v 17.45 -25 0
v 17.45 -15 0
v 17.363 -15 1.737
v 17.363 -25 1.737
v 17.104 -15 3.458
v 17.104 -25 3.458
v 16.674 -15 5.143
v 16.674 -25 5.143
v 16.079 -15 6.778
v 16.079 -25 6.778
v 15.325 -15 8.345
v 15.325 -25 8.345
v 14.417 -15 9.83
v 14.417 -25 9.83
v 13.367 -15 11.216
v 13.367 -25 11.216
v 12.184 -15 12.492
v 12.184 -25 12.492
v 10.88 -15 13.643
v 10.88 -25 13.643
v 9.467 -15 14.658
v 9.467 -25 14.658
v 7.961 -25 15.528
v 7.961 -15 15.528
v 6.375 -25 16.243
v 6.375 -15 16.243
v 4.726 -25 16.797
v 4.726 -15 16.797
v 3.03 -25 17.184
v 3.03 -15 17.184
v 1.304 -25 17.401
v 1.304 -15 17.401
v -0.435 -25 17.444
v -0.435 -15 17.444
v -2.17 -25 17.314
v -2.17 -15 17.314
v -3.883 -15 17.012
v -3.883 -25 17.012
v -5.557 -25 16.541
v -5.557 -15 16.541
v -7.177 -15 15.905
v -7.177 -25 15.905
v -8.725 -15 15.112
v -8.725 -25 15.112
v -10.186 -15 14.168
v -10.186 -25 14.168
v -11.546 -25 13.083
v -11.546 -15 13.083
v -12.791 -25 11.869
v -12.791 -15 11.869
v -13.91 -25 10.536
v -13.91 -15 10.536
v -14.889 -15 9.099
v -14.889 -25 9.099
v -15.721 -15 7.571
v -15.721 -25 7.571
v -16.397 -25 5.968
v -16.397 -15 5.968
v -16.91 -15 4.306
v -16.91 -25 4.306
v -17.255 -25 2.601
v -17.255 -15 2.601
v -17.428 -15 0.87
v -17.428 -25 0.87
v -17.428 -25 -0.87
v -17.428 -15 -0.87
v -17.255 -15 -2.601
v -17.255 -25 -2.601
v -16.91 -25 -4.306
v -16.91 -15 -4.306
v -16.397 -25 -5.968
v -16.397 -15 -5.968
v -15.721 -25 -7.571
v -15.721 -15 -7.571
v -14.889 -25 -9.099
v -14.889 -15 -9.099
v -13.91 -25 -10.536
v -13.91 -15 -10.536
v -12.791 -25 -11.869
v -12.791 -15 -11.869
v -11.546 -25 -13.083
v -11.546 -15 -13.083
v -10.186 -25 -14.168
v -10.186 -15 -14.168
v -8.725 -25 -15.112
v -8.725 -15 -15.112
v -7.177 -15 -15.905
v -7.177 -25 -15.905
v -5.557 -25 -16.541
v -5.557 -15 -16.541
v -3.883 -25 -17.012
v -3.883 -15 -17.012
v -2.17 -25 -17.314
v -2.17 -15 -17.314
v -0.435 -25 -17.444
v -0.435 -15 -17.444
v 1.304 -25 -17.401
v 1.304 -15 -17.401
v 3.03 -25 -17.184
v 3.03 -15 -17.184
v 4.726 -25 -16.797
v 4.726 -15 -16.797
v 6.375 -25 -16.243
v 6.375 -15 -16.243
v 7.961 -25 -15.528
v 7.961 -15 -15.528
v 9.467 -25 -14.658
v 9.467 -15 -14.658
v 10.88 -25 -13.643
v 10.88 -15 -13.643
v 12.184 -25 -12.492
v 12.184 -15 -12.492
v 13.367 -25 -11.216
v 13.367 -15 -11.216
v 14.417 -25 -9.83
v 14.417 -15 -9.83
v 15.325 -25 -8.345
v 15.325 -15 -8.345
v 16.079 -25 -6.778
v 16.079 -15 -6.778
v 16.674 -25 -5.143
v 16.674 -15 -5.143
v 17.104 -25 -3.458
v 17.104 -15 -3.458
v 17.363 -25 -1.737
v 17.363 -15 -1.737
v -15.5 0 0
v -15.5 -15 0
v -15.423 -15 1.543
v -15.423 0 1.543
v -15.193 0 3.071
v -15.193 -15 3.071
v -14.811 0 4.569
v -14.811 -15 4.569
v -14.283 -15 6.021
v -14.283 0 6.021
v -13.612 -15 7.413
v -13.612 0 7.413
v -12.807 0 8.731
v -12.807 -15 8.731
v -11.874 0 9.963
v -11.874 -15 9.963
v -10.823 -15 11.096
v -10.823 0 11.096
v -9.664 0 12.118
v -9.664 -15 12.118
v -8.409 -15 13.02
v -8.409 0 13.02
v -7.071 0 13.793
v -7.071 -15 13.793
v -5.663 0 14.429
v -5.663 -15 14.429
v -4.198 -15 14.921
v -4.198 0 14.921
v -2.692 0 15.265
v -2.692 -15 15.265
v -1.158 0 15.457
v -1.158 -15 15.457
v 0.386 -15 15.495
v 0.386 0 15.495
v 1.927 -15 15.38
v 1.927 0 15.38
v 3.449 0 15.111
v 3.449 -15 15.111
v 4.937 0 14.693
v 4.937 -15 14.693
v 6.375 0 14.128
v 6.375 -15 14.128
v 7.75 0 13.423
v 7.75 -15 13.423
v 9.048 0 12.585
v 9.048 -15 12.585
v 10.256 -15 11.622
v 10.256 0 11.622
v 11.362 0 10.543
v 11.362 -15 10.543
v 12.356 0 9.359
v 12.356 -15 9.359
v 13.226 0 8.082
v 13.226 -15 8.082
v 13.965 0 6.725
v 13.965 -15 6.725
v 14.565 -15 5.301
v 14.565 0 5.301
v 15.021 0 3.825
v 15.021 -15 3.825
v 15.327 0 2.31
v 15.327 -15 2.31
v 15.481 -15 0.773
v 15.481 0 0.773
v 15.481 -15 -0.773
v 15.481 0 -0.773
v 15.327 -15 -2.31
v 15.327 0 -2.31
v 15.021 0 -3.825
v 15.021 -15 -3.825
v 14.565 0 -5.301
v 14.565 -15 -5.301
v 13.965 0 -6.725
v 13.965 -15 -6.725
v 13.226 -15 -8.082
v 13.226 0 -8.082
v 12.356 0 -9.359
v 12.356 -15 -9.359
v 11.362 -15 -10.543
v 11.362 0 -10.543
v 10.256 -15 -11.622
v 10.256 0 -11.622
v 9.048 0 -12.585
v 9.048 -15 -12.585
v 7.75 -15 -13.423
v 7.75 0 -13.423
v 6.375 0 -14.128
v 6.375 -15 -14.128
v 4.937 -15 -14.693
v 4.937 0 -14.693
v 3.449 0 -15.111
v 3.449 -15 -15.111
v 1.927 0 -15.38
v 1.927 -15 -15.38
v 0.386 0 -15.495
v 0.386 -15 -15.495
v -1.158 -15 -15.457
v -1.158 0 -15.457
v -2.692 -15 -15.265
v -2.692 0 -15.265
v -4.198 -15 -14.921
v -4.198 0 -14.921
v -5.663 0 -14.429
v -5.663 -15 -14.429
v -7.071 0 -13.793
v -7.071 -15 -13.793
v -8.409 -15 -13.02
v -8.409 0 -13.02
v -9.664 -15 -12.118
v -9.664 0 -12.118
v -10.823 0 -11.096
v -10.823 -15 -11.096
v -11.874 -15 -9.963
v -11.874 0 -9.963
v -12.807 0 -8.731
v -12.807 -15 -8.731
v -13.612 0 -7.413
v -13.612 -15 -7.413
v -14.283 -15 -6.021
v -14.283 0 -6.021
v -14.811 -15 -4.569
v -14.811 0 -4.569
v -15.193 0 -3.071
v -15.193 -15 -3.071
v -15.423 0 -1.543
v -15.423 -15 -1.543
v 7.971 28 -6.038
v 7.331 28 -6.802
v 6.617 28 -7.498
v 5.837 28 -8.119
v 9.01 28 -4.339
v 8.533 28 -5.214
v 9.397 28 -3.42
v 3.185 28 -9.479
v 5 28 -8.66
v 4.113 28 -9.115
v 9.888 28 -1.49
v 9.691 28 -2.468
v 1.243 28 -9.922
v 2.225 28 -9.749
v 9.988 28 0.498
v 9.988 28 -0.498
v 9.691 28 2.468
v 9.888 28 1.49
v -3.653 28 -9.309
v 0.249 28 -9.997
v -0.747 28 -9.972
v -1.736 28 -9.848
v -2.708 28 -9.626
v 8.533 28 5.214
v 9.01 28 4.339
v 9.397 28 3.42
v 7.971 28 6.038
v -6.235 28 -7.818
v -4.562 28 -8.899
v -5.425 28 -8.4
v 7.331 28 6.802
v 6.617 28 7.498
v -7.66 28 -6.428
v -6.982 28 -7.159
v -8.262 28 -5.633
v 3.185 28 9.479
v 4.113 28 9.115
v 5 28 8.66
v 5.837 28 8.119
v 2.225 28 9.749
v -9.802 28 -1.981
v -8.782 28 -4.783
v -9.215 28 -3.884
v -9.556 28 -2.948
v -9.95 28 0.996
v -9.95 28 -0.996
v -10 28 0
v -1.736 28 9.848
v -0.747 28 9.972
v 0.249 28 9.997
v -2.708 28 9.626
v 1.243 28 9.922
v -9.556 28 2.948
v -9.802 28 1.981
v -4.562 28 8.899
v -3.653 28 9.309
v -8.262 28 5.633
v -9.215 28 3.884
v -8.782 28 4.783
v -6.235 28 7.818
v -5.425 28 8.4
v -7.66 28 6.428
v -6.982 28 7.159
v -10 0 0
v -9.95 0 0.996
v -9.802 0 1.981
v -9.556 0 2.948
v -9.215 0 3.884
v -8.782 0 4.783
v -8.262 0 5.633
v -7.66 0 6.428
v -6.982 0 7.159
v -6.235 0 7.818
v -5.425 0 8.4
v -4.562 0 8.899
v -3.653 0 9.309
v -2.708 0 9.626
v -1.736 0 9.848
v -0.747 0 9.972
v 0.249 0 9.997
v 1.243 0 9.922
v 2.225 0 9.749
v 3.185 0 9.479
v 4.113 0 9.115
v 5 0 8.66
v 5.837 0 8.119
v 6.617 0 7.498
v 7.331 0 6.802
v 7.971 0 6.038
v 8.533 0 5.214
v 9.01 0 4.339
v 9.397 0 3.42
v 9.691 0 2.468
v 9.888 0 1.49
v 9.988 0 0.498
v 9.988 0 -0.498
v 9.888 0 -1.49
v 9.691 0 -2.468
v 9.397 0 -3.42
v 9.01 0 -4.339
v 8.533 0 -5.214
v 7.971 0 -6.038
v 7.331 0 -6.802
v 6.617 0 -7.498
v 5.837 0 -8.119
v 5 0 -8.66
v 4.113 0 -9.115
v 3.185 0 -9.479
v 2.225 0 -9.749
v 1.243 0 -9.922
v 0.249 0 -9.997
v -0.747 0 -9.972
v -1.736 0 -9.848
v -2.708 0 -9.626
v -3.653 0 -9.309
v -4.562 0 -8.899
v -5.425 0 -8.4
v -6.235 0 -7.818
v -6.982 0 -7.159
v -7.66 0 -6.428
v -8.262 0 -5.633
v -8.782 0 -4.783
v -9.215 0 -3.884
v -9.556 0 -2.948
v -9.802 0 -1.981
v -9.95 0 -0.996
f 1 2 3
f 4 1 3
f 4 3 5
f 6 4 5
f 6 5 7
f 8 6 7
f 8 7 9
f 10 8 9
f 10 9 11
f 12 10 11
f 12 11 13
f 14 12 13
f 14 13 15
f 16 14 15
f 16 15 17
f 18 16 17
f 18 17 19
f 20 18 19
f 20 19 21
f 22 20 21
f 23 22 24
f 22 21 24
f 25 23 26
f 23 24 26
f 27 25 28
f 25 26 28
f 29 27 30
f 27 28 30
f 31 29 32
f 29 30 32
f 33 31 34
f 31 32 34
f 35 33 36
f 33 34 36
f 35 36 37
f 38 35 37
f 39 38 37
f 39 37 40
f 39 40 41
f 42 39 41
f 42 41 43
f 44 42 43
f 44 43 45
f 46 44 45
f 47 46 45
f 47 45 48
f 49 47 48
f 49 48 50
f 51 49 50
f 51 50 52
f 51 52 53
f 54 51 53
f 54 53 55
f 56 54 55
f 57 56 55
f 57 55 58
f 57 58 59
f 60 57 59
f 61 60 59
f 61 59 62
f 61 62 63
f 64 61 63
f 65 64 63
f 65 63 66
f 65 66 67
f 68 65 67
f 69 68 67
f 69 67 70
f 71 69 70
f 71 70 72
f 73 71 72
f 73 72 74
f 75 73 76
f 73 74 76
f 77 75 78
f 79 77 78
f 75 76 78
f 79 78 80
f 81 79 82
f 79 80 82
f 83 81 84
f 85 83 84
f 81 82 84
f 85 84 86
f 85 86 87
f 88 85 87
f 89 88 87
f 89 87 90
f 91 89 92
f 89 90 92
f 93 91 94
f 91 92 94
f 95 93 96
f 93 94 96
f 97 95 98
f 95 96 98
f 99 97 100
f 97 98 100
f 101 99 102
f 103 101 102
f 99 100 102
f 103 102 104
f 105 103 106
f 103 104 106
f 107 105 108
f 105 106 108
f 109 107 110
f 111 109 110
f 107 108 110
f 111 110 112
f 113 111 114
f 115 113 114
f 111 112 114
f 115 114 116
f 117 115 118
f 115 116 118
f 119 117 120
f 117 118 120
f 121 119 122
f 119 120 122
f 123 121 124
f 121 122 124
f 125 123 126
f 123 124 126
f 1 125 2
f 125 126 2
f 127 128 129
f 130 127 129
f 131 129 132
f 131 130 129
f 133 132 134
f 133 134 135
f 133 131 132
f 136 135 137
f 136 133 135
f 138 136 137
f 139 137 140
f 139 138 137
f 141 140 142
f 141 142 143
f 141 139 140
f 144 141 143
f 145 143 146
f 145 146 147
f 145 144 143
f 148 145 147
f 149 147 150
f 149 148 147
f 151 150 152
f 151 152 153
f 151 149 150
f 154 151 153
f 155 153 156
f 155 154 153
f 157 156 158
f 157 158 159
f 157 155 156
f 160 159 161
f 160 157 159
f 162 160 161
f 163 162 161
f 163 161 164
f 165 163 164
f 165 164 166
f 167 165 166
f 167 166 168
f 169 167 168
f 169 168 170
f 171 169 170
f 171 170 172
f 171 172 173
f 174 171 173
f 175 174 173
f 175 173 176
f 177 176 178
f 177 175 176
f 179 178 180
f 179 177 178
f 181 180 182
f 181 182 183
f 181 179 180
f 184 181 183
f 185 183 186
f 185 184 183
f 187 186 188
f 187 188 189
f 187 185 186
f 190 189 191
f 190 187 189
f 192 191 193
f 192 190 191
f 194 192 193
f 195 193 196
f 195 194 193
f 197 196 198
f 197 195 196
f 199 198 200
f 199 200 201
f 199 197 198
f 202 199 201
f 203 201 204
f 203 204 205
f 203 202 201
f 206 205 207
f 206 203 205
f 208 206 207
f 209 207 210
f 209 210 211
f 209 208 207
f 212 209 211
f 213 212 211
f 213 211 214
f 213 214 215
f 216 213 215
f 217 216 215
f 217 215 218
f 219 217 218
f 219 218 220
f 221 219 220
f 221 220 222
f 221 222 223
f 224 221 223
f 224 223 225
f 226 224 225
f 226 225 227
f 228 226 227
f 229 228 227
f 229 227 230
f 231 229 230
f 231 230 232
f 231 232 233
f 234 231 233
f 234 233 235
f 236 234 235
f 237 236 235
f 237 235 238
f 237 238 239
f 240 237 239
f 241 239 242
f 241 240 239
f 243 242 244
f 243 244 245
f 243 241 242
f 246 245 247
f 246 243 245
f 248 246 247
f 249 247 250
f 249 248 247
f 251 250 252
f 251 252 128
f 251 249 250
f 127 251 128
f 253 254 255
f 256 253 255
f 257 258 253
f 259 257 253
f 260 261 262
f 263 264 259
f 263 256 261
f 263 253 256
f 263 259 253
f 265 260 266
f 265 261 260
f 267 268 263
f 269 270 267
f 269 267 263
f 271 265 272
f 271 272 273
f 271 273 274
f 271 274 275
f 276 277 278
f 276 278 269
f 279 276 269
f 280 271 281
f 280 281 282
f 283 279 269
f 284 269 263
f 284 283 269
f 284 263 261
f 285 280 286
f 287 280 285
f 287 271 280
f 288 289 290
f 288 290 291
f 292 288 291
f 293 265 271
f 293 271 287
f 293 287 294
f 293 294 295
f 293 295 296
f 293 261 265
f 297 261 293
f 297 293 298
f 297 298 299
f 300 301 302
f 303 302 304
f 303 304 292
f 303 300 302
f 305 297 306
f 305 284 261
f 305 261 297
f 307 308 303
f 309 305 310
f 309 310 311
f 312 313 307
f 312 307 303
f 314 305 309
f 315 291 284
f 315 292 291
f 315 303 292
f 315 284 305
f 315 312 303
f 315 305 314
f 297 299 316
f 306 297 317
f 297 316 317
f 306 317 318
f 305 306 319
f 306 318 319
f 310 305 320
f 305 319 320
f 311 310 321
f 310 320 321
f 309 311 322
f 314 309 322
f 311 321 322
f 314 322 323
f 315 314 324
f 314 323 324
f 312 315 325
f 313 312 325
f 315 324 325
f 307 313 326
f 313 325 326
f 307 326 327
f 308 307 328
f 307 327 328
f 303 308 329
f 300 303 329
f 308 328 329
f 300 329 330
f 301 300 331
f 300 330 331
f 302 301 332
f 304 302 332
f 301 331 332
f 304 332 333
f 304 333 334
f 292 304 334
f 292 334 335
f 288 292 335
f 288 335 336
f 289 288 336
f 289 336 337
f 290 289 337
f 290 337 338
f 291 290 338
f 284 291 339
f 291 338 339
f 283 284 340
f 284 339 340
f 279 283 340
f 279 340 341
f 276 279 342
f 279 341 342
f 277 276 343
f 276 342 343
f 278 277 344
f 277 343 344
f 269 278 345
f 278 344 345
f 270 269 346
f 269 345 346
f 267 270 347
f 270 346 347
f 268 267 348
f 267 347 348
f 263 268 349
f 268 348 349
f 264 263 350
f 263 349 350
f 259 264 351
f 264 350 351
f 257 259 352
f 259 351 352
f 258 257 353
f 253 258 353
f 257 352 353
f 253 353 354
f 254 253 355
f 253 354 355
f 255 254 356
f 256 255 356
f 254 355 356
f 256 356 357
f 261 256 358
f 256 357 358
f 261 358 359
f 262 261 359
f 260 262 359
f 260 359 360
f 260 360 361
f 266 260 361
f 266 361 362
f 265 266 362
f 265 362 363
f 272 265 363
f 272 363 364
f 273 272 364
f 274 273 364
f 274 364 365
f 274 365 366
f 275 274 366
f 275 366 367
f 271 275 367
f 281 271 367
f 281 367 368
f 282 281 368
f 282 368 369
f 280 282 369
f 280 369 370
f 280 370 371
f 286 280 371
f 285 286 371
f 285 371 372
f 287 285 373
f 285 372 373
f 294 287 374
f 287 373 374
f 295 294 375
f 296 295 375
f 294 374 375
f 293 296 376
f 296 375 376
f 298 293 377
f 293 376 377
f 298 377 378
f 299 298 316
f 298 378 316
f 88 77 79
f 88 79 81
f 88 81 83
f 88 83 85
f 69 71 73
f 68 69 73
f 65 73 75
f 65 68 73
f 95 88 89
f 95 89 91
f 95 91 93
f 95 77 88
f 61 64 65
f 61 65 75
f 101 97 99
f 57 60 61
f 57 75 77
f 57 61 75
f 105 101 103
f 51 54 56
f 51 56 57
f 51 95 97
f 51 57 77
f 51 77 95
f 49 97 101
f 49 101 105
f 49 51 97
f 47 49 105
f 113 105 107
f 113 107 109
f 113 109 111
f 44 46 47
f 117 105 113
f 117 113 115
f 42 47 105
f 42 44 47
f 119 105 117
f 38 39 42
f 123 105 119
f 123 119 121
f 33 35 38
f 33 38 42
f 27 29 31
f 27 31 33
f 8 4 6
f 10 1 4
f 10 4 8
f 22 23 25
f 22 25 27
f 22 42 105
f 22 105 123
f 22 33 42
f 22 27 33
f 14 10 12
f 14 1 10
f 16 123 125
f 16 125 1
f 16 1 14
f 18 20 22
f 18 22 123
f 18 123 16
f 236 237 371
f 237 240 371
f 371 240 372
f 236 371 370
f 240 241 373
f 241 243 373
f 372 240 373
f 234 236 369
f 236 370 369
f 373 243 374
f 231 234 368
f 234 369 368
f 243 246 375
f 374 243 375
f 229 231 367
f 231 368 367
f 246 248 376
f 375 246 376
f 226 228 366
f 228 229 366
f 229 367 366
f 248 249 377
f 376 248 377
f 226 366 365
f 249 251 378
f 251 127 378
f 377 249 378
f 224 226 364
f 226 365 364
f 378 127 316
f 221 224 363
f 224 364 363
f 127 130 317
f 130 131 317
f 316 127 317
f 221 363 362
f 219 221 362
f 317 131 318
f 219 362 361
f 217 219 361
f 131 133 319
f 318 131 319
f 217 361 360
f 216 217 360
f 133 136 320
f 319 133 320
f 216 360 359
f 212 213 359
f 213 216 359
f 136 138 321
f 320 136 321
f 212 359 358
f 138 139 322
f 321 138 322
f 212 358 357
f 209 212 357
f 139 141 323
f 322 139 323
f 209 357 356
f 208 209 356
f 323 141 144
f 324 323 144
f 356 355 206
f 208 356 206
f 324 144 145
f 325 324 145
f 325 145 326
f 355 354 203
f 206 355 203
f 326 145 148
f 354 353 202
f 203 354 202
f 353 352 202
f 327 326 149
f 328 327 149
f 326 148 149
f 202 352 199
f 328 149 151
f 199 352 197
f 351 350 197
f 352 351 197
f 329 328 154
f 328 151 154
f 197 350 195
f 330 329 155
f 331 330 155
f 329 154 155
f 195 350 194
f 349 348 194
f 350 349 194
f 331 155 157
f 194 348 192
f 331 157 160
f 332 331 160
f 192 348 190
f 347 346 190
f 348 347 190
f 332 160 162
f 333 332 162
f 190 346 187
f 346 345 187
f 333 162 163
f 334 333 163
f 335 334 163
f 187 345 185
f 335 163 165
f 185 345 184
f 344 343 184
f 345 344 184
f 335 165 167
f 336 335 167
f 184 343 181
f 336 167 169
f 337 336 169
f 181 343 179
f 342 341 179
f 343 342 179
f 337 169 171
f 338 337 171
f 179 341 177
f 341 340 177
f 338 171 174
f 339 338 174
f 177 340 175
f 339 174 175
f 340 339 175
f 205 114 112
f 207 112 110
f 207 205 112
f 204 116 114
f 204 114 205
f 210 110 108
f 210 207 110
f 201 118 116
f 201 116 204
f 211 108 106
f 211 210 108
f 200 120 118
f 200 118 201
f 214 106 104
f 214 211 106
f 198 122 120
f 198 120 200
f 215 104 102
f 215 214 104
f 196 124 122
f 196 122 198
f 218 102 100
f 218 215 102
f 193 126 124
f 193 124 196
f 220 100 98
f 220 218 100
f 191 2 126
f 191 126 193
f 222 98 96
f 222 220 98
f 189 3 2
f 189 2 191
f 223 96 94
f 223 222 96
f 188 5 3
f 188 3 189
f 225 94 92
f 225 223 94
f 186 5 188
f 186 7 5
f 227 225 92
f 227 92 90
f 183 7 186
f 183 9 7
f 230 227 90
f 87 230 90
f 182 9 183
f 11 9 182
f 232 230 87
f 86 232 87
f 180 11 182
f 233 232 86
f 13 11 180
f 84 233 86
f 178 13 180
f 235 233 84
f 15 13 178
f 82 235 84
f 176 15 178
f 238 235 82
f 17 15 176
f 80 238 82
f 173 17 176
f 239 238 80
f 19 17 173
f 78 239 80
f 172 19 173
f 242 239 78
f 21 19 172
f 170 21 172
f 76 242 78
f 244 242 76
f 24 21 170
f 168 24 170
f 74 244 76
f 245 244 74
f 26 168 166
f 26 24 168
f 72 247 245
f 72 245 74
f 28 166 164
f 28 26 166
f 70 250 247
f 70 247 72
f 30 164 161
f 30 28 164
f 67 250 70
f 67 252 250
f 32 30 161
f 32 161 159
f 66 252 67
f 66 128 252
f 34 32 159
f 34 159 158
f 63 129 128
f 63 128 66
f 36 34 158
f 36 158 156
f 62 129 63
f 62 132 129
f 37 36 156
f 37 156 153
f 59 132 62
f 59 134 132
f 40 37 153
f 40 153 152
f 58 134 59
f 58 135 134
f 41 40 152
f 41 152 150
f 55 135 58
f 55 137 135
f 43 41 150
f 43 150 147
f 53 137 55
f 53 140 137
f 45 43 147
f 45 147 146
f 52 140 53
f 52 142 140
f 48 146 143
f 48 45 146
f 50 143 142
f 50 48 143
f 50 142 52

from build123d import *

# Parameters (mm, degrees)
F0_R     = 17.4495
F1_DEPTH = 25
F2_R     = 26.49903
F2_R_2   = 15.5
F3_DEPTH = 15
F4_R     = 10
F5_DEPTH = 28


with BuildPart() as f1:
    # F0 (on Front) → F1 (new body)
    with BuildSketch(Plane.XZ):
        Circle(F0_R)
    extrude(amount=F1_DEPTH)

    # F2 (on face) → F3 (cut)
    with BuildSketch(Plane(origin=(0, 0, 0), x_dir=(-1, 0, 0), z_dir=(0, 1, 0))):
        with Locations((2.900601, 0)):
            Circle(F2_R)
        Circle(F2_R_2, mode=Mode.SUBTRACT)
    extrude(amount=-F3_DEPTH, mode=Mode.SUBTRACT)

    # F4 (on face) → F5 (join)
    with BuildSketch(Plane(origin=(0, 0, 0), x_dir=(-1, 0, 0), z_dir=(0, 1, 0))):
        Circle(F4_R)
    extrude(amount=F5_DEPTH)


solid = f1.part
